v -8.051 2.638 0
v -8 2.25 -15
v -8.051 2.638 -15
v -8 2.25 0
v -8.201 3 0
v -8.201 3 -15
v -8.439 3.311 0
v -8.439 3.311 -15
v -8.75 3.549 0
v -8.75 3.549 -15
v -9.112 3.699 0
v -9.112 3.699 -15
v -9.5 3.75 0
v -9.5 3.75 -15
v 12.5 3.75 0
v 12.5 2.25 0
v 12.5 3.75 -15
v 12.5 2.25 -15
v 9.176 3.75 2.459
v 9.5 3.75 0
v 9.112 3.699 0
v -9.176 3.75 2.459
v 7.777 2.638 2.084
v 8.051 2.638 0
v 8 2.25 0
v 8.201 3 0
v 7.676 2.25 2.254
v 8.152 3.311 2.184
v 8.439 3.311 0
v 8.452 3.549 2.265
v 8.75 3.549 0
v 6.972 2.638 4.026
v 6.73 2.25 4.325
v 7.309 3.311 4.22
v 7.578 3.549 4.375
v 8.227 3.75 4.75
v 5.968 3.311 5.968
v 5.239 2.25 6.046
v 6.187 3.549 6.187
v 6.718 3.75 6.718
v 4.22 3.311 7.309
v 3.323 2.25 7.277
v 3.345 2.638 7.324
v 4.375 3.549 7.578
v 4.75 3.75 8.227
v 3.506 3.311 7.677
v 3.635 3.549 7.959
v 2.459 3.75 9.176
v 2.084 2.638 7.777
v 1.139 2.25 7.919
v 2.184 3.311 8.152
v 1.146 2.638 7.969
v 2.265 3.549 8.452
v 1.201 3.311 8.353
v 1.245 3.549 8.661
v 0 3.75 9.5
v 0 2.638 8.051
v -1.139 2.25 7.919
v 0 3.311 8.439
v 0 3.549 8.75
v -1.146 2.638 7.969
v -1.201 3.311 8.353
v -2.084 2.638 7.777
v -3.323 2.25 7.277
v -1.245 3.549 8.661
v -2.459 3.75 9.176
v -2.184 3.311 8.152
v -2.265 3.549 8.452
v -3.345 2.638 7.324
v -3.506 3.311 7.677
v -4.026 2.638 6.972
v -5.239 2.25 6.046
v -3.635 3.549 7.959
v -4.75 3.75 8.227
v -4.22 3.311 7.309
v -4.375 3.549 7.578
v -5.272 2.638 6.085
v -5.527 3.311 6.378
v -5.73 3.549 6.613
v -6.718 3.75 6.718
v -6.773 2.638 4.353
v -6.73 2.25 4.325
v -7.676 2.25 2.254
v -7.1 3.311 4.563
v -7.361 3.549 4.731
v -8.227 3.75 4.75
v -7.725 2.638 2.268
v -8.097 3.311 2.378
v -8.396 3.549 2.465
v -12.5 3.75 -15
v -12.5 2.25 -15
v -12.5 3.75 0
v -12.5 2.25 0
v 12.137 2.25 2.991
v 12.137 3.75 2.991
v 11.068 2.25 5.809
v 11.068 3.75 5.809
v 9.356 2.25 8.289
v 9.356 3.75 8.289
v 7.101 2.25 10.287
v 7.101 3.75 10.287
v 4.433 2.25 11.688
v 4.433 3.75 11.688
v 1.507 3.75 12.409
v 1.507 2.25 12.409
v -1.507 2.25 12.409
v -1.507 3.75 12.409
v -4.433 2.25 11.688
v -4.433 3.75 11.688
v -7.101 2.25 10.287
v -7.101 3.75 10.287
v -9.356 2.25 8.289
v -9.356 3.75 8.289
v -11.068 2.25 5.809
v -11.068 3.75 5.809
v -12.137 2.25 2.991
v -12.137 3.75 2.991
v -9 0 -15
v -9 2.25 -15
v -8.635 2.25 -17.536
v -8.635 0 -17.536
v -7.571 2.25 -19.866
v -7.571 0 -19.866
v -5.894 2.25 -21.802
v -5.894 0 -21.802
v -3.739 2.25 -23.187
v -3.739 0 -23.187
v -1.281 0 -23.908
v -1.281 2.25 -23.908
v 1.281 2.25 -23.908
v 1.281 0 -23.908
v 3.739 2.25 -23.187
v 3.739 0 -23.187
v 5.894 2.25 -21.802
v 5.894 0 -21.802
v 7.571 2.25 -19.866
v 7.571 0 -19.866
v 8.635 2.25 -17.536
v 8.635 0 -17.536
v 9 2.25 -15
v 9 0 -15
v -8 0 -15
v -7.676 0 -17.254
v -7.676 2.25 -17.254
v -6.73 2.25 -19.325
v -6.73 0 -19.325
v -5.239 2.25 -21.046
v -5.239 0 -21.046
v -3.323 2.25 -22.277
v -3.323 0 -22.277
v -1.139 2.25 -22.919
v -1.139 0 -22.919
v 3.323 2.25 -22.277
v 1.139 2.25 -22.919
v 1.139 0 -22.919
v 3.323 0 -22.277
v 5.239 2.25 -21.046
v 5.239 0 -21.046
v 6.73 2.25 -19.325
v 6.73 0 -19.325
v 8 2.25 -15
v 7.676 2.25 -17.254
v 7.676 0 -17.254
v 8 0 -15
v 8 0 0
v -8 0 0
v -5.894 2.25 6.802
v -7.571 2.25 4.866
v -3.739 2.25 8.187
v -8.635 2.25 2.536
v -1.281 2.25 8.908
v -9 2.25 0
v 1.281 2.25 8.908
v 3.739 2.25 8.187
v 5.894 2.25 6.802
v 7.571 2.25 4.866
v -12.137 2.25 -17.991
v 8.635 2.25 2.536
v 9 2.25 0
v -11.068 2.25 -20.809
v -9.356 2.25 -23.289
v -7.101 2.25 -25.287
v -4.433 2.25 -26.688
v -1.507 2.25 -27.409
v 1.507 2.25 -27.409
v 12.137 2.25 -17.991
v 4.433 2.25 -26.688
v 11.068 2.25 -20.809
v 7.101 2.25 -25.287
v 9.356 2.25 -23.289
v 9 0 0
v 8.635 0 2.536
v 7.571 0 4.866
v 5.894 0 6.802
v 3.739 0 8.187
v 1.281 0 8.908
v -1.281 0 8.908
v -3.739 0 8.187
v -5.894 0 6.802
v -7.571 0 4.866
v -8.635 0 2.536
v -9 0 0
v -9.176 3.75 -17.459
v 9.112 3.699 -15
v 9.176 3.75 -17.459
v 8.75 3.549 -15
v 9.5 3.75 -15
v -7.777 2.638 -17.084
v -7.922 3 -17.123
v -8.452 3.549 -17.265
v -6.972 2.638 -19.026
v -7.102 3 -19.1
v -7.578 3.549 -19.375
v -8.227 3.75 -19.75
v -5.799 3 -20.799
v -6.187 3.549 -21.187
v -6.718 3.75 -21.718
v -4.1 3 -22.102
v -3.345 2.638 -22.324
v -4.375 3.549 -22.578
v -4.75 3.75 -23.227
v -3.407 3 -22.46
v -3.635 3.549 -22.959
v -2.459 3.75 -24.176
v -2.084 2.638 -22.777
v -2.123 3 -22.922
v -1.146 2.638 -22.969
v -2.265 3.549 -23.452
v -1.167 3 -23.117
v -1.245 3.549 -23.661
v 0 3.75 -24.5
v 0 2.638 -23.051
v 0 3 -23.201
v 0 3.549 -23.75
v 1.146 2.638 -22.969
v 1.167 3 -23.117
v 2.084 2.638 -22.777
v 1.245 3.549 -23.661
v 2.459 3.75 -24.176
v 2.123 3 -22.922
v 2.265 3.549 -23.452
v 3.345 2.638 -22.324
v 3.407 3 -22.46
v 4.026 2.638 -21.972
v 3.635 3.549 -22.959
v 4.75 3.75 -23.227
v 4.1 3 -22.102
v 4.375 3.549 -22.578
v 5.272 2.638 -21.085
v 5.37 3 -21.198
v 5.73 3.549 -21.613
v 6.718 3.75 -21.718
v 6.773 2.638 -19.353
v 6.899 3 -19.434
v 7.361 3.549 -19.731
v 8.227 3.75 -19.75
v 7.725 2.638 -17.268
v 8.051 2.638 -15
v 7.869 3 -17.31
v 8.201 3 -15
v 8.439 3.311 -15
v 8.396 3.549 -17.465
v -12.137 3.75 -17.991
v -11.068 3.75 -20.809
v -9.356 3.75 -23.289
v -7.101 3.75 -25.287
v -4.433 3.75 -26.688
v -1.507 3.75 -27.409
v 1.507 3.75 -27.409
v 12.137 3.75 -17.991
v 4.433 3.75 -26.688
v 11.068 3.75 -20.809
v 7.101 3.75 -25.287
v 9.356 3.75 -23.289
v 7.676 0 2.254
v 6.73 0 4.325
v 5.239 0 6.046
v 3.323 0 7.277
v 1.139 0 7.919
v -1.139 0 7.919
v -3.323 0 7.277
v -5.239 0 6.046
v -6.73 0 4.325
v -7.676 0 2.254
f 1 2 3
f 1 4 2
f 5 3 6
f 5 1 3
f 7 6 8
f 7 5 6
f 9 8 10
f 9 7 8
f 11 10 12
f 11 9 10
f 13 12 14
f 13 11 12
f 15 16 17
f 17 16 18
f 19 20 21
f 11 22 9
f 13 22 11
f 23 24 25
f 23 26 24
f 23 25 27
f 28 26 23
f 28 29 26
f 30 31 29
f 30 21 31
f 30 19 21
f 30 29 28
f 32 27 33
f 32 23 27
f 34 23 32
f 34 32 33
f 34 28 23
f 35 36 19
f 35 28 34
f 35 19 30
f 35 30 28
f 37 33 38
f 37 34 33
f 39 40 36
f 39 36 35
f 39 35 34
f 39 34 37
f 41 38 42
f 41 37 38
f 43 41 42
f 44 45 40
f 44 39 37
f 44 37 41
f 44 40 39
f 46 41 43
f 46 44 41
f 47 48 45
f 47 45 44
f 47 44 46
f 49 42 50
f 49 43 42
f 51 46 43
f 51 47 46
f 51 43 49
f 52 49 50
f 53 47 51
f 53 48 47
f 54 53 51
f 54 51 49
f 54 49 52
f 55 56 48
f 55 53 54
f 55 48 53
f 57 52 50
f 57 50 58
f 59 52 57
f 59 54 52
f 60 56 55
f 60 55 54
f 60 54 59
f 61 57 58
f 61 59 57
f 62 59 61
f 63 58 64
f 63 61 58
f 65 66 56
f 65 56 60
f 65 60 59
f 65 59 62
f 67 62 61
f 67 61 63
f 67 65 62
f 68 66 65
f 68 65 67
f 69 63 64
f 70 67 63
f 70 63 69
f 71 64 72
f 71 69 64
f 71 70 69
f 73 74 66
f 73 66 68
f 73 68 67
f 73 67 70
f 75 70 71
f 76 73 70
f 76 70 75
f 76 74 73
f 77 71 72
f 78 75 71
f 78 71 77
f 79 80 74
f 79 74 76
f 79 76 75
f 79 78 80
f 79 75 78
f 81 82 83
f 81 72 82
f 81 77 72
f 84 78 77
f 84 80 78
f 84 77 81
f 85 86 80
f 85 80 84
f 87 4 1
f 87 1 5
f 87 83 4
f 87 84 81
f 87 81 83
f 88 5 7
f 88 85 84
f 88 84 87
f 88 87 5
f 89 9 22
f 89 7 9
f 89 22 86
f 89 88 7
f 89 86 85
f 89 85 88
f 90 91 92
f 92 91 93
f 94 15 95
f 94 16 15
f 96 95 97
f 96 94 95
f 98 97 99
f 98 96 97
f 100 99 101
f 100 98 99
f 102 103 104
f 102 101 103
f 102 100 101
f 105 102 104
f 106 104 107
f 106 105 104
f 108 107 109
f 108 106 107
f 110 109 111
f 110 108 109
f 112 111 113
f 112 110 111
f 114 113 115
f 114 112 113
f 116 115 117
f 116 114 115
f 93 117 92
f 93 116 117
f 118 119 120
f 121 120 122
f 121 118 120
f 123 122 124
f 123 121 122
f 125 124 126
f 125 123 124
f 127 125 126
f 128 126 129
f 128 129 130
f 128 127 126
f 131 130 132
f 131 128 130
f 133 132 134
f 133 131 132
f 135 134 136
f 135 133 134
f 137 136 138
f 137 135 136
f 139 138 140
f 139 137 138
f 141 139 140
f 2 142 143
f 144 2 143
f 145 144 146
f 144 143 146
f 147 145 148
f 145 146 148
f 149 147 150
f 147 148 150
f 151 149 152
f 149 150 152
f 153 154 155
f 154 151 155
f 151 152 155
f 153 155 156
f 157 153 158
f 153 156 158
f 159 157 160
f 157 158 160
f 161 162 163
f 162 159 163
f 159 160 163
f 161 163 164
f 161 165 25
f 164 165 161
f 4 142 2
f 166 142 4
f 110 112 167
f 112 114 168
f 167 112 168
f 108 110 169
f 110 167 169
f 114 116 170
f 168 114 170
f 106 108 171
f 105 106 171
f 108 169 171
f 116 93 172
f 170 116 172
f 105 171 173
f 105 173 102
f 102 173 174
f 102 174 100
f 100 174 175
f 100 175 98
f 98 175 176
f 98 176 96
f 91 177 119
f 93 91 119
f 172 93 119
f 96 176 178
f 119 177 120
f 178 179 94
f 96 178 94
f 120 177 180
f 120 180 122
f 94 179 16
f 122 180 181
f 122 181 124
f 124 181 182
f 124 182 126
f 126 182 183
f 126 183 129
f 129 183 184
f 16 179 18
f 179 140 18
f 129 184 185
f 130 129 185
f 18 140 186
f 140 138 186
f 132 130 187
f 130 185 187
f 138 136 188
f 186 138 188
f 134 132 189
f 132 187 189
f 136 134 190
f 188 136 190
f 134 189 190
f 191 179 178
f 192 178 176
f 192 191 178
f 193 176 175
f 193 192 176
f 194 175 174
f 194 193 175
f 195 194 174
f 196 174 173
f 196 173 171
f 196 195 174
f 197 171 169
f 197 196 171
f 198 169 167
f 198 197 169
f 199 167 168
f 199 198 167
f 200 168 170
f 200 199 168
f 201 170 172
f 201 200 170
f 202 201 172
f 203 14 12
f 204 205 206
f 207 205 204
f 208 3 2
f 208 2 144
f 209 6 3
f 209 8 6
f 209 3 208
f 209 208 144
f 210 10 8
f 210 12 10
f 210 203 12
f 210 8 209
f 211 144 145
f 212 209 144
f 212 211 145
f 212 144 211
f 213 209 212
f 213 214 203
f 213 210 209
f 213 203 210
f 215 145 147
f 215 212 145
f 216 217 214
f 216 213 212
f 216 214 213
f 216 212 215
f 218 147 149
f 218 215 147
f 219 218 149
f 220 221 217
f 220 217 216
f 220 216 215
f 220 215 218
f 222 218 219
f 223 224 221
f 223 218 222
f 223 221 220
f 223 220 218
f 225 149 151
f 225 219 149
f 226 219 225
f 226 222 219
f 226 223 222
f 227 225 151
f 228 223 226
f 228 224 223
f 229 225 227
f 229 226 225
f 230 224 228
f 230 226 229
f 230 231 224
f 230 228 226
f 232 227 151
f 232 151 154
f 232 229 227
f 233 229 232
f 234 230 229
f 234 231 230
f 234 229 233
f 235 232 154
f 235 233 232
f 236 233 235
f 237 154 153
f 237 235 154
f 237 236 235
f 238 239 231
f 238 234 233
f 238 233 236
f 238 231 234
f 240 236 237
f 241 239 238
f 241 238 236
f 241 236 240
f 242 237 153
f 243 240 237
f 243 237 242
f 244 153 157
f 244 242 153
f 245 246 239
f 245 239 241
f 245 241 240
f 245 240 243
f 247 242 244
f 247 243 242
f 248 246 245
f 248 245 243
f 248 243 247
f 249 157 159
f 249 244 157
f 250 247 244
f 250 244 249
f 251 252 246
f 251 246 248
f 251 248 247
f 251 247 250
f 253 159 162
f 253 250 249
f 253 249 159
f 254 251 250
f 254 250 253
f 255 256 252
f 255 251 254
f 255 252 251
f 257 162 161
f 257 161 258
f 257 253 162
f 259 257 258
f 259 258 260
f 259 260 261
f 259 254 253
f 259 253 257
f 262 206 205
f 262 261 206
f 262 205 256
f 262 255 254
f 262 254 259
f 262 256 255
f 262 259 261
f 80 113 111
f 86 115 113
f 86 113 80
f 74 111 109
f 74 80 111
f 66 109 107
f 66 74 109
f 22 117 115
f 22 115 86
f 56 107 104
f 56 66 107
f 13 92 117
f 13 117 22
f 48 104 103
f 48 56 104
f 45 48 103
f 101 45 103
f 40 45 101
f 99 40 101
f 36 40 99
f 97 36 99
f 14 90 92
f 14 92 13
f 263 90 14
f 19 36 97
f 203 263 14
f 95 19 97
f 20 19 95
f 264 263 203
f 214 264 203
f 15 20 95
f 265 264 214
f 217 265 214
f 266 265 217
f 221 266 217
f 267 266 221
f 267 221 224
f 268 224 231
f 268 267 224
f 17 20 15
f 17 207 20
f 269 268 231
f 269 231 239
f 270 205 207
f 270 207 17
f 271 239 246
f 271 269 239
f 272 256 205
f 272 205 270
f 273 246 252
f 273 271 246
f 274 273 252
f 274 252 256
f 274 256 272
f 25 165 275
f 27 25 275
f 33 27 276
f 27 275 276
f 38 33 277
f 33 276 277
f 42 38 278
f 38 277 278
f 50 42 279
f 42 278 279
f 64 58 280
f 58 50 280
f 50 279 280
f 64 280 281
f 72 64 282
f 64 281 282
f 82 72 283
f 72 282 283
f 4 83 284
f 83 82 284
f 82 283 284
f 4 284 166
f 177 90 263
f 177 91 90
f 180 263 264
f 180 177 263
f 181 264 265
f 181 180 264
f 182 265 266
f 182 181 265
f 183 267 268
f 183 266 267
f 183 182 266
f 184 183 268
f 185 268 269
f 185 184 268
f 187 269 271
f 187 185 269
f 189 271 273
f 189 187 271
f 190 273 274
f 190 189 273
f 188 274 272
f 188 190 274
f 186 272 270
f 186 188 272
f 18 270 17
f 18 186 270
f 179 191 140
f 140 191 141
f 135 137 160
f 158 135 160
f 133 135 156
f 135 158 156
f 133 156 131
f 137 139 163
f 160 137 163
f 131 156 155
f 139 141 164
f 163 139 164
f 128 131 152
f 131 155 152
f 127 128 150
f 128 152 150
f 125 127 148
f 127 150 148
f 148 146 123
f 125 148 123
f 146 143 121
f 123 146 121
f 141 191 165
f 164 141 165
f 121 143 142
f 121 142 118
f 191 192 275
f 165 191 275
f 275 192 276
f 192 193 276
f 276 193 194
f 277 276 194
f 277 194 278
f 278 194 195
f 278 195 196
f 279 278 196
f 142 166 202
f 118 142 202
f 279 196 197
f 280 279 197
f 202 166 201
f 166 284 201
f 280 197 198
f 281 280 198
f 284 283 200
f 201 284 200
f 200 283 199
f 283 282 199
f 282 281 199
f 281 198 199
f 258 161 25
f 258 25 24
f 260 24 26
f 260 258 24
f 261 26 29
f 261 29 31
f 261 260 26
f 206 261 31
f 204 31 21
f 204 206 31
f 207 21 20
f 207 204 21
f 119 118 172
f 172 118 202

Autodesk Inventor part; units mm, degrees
ref_plane "YZ Plane" through (0, 0, 0) normal (1, 0, 0) x (0, 1, 0)
ref_plane "XZ Plane" through (0, 0, 0) normal (0, 1, 0) x (-1, 0, 0)
ref_plane "XY Plane" through (0, 0, 0) normal (0, 0, 1) x (1, 0, 0)
sketch "Sketch1" plane through (0, 0, 0) normal (0, 1, 0) x (-1, 0, 0)
  line L0 (0, 0) -> (0, -15) construction
  line L1 (-9, 0) -> (-9, -15)
  line L2 (9, -15) -> (9, 0)
  arc A0 (9, 0) -> (-9, 0) centre (0, 0) ccw
  arc A1 (-9, -15) -> (9, -15) centre (0, -15) ccw
  line L3 (0, 0) -> (0, -15) construction
  line L4 (-8, 0) -> (-8, -15)
  line L5 (8, -15) -> (8, 0)
  arc A2 (8, 0) -> (-8, 0) centre (0, 0) ccw
  arc A3 (-8, -15) -> (8, -15) centre (0, -15) ccw
  point P0 (0, -7.5)
  point P1 (0, -7.5)
  dimension "d0" = 15
  dimension "d1" = 18
  dimension "d2" = 15
  dimension "d3" = 16
extrude "Extrusion1" add sketch "Sketch1" along normal blind 3
sketch "Sketch2" plane through (0, 3, 0) normal (0, 1, 0) x (1, 0, 0)
  line L0 (0, 0) -> (0, 15) construction
  line L1 (12.5, 0) -> (12.5, 15)
  line L2 (-12.5, 15) -> (-12.5, 0)
  arc A0 (-12.5, 0) -> (12.5, 0) centre (0, 0) ccw
  arc A1 (12.5, 15) -> (-12.5, 15) centre (0, 15) ccw
  line L3 (0, 0) -> (0, 15) construction
  line L4 (8, 0) -> (8, 15)
  line L5 (-8, 15) -> (-8, 0)
  arc A2 (-8, 0) -> (8, 0) centre (0, 0) ccw
  arc A3 (8, 15) -> (-8, 15) centre (0, 15) ccw
  point P0 (0, 7.5)
  point P1 (0, 7.5)
  dimension "d6" = 15
  dimension "d7" = 25
  dimension "d8" = 15
  dimension "d9" = 16
extrude "Extrusion2" add sketch "Sketch2" along normal mid plane 1.5
fillet "Fillet1" radius 1.5 4 edges at (0, 3.75, -23) (8, 3.75, -7.5) (0, 3.75, 8) (-8, 3.75, -7.5)
properties part number "Spacer"
